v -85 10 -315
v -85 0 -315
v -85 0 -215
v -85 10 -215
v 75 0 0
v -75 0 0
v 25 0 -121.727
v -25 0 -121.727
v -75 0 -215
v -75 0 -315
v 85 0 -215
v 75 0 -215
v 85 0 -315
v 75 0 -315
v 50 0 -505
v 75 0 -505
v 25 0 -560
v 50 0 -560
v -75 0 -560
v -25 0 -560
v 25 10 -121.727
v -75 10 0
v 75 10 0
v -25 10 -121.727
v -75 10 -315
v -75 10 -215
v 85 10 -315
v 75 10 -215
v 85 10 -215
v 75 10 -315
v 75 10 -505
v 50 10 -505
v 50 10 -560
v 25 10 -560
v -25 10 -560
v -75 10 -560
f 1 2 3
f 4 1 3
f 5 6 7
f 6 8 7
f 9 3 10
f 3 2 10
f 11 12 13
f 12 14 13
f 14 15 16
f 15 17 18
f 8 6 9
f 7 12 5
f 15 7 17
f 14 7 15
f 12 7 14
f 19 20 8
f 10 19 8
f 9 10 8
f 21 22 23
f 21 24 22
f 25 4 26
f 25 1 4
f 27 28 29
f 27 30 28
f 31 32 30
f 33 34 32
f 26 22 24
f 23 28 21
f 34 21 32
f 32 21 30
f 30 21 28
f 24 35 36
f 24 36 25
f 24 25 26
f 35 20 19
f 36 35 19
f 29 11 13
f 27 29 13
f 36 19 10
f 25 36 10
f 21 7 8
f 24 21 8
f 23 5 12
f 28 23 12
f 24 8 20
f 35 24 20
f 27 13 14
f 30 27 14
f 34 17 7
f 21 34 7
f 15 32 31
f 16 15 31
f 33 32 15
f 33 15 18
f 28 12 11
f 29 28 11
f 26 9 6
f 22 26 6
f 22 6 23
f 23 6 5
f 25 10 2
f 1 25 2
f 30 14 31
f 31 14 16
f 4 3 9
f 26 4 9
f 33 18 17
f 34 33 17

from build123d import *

# Parameters (mm, degrees)
BOSS_EXTRUDE1_DEPTH = 10
SKETCH2_W           = 25
SKETCH2_H           = 55
CUT_EXTRUDE1_DEPTH  = 10


with BuildPart() as part:
    # Sketch1 → Boss-Extrude1 (new body)
    with BuildSketch(Plane(origin=(0, 0, 0), x_dir=(1, 0, 0), z_dir=(0, 1, 0))):
        Polygon((-75, 215), (-75, 0), (75, 0), (75, 215), (85, 215), (85, 315), (75, 315), (75, 560), (25, 560), (25, 121.727049474), (-25, 121.727049474), (-25, 560), (-75, 560), (-75, 315), (-85, 315), (-85, 215), align=None)
    extrude(amount=BOSS_EXTRUDE1_DEPTH)

    # Sketch2 → Cut-Extrude1 (cut)
    with BuildSketch(Plane(origin=(0, 10, 0), x_dir=(1, 0, 0), z_dir=(0, 1, 0))):
        with Locations((62.5, 532.5)):
            Rectangle(SKETCH2_W, SKETCH2_H)
    extrude(amount=-CUT_EXTRUDE1_DEPTH, mode=Mode.SUBTRACT)


solid = part.part
